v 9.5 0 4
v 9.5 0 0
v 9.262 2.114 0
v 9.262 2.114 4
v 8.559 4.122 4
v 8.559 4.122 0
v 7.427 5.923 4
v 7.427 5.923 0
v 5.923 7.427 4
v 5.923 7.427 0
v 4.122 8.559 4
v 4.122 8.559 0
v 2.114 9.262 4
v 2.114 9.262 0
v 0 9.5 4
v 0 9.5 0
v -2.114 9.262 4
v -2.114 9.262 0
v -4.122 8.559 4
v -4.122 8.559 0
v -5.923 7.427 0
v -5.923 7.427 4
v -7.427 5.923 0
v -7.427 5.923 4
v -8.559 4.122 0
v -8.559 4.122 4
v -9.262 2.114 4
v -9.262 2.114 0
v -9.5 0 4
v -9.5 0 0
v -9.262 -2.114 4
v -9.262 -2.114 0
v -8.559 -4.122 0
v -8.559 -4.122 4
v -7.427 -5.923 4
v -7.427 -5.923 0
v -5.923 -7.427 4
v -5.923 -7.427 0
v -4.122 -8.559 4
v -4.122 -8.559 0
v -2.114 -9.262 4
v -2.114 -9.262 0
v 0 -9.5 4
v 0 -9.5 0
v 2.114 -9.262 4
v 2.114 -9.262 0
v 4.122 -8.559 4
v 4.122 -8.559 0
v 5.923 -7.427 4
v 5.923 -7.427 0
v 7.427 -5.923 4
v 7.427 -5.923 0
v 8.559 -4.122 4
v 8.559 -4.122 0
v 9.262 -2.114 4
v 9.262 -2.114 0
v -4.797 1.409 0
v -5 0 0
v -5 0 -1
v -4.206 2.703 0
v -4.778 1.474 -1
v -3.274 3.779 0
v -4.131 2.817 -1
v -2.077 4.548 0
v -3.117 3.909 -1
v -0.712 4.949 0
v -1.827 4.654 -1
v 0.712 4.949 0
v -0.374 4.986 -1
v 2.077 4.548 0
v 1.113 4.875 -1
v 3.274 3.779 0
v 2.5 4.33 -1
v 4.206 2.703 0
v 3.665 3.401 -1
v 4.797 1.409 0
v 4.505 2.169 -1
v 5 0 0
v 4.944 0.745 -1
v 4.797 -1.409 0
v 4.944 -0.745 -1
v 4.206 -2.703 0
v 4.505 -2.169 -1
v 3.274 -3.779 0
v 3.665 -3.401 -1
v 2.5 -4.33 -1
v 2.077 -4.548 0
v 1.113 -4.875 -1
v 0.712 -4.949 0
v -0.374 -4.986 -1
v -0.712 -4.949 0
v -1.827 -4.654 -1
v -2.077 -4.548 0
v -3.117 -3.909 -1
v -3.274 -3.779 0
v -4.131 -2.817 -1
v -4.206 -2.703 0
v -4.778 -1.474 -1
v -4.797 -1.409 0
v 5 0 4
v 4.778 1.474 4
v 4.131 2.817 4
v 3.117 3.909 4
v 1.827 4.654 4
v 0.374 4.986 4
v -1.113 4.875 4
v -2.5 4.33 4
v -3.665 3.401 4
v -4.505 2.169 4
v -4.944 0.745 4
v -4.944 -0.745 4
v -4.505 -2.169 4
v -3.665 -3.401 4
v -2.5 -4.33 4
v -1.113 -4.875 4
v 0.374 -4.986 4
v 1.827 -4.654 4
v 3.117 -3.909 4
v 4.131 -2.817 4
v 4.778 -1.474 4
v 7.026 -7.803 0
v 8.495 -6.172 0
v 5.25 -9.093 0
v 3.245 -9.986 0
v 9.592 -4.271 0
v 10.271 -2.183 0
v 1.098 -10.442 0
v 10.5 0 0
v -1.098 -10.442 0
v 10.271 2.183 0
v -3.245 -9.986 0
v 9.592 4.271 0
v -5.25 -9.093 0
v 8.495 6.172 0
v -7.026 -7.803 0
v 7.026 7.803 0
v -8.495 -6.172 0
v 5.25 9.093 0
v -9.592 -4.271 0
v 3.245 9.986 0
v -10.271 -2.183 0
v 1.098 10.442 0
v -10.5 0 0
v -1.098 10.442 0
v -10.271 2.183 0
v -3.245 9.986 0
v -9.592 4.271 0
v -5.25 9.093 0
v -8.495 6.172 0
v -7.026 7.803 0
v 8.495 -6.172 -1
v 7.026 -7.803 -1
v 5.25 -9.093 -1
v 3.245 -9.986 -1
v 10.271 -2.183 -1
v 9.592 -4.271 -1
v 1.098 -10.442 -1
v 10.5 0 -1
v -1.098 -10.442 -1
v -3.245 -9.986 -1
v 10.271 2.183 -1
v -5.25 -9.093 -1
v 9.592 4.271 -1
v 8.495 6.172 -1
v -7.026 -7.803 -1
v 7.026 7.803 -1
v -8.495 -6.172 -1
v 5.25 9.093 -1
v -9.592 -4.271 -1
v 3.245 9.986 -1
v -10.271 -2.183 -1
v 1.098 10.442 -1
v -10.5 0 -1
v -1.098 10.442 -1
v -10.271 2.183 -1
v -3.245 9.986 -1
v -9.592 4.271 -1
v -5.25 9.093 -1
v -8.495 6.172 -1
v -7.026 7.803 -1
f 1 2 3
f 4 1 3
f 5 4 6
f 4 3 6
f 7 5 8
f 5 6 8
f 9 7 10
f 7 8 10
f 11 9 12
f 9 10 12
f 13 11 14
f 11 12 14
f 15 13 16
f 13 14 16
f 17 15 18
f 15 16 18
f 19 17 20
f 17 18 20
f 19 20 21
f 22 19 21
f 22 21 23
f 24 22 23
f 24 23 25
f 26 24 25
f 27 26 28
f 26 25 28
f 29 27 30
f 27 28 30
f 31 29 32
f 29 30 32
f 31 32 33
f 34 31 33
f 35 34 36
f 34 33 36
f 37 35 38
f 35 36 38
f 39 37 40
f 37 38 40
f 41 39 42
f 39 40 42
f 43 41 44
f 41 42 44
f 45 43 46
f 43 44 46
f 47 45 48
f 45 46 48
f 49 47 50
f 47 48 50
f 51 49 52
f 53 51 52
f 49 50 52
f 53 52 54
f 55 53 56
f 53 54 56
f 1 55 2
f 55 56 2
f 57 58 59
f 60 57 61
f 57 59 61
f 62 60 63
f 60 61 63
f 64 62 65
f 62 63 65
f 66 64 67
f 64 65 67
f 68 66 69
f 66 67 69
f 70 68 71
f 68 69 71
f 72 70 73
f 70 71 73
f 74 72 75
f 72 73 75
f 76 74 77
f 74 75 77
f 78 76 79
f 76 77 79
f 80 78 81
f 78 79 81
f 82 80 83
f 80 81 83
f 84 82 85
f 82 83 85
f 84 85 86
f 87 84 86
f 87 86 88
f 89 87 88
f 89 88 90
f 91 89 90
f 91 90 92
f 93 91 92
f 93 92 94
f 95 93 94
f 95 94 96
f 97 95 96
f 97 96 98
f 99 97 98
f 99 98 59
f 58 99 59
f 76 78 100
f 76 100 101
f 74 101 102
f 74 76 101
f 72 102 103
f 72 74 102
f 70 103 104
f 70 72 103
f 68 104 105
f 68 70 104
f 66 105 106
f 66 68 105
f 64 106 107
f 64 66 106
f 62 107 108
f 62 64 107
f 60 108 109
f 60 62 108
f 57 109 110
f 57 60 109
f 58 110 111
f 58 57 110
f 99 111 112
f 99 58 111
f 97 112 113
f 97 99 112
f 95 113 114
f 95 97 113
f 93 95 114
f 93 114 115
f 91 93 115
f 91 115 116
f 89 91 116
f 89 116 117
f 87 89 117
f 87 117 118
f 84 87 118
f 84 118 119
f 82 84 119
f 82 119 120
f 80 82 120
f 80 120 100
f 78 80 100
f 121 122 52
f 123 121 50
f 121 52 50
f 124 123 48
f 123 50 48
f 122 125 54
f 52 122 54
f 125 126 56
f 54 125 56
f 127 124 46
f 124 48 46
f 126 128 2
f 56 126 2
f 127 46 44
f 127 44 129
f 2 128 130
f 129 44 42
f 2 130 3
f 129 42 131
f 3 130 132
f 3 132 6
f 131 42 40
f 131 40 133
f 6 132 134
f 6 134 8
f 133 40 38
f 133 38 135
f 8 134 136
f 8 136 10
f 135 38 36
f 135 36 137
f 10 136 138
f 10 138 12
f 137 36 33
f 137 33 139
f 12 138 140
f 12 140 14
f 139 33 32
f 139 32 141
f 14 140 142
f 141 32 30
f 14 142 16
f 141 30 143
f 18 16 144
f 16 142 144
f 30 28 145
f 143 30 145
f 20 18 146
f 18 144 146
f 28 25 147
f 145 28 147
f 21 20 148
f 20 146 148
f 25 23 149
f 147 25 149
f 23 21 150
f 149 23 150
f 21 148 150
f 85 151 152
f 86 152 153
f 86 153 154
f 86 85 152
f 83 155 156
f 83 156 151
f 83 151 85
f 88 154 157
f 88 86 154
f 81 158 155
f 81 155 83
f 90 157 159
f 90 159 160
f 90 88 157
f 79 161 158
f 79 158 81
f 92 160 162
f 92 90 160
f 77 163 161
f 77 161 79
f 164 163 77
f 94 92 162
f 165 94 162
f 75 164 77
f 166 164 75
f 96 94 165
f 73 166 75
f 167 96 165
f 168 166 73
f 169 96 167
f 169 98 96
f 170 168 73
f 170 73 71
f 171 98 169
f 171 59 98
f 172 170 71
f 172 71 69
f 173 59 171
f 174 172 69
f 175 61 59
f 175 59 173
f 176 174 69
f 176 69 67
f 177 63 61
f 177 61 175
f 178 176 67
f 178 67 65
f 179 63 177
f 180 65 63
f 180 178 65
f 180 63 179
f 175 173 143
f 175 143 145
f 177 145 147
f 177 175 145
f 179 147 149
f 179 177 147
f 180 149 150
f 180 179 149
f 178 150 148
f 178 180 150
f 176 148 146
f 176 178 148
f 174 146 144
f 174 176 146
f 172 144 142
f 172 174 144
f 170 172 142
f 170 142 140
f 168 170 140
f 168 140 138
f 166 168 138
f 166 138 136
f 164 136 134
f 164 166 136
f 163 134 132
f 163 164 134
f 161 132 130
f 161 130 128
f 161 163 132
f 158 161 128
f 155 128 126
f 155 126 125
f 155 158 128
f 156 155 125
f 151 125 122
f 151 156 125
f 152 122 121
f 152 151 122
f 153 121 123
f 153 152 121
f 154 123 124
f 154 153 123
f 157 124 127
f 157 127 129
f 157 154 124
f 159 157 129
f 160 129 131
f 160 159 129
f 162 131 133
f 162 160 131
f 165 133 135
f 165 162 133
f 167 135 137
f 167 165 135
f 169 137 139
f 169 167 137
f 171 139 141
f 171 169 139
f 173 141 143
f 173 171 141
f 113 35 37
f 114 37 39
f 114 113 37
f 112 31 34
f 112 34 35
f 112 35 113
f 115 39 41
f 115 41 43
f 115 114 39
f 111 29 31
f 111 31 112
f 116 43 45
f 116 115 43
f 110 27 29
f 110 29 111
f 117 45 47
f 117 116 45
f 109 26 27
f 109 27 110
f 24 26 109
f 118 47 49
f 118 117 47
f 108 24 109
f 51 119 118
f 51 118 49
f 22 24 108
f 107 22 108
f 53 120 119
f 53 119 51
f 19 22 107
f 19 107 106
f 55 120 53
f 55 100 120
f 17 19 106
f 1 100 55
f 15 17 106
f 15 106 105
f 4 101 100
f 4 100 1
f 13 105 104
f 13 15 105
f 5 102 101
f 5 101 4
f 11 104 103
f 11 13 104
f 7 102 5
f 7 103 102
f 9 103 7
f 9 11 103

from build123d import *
from build123d.topology import SkipClean

# Parameters (mm, degrees)
SKETCH_1_R      = 9.5
SKETCH_1_R_2    = 5
EXTRUDE_1_DEPTH = 4
EXTRUDE_START   = 1
SKETCH_2_R      = 10.5
SKETCH_2_R_2    = 5
EXTRUDE_2_DEPTH = 1


with BuildPart() as part:
    # 草图1 → 凸台-拉伸1 (new body)
    with BuildSketch(Plane.XY):
        Circle(SKETCH_1_R)
        Circle(SKETCH_1_R_2, mode=Mode.SUBTRACT)
    extrude(amount=EXTRUDE_1_DEPTH)

    # 草图2 → 凸台-拉伸2 (add)
    with SkipClean():  # the faces are left unmerged after this step: merging them gives an invalid solid
        with BuildSketch(Plane(origin=(0, 0, 0), x_dir=(-1, 0, 0), z_dir=(0, 0, -1)).offset(EXTRUDE_START)):
            Circle(SKETCH_2_R)
            Circle(SKETCH_2_R_2, mode=Mode.SUBTRACT)
        extrude(amount=-EXTRUDE_2_DEPTH)


solid = part.part
